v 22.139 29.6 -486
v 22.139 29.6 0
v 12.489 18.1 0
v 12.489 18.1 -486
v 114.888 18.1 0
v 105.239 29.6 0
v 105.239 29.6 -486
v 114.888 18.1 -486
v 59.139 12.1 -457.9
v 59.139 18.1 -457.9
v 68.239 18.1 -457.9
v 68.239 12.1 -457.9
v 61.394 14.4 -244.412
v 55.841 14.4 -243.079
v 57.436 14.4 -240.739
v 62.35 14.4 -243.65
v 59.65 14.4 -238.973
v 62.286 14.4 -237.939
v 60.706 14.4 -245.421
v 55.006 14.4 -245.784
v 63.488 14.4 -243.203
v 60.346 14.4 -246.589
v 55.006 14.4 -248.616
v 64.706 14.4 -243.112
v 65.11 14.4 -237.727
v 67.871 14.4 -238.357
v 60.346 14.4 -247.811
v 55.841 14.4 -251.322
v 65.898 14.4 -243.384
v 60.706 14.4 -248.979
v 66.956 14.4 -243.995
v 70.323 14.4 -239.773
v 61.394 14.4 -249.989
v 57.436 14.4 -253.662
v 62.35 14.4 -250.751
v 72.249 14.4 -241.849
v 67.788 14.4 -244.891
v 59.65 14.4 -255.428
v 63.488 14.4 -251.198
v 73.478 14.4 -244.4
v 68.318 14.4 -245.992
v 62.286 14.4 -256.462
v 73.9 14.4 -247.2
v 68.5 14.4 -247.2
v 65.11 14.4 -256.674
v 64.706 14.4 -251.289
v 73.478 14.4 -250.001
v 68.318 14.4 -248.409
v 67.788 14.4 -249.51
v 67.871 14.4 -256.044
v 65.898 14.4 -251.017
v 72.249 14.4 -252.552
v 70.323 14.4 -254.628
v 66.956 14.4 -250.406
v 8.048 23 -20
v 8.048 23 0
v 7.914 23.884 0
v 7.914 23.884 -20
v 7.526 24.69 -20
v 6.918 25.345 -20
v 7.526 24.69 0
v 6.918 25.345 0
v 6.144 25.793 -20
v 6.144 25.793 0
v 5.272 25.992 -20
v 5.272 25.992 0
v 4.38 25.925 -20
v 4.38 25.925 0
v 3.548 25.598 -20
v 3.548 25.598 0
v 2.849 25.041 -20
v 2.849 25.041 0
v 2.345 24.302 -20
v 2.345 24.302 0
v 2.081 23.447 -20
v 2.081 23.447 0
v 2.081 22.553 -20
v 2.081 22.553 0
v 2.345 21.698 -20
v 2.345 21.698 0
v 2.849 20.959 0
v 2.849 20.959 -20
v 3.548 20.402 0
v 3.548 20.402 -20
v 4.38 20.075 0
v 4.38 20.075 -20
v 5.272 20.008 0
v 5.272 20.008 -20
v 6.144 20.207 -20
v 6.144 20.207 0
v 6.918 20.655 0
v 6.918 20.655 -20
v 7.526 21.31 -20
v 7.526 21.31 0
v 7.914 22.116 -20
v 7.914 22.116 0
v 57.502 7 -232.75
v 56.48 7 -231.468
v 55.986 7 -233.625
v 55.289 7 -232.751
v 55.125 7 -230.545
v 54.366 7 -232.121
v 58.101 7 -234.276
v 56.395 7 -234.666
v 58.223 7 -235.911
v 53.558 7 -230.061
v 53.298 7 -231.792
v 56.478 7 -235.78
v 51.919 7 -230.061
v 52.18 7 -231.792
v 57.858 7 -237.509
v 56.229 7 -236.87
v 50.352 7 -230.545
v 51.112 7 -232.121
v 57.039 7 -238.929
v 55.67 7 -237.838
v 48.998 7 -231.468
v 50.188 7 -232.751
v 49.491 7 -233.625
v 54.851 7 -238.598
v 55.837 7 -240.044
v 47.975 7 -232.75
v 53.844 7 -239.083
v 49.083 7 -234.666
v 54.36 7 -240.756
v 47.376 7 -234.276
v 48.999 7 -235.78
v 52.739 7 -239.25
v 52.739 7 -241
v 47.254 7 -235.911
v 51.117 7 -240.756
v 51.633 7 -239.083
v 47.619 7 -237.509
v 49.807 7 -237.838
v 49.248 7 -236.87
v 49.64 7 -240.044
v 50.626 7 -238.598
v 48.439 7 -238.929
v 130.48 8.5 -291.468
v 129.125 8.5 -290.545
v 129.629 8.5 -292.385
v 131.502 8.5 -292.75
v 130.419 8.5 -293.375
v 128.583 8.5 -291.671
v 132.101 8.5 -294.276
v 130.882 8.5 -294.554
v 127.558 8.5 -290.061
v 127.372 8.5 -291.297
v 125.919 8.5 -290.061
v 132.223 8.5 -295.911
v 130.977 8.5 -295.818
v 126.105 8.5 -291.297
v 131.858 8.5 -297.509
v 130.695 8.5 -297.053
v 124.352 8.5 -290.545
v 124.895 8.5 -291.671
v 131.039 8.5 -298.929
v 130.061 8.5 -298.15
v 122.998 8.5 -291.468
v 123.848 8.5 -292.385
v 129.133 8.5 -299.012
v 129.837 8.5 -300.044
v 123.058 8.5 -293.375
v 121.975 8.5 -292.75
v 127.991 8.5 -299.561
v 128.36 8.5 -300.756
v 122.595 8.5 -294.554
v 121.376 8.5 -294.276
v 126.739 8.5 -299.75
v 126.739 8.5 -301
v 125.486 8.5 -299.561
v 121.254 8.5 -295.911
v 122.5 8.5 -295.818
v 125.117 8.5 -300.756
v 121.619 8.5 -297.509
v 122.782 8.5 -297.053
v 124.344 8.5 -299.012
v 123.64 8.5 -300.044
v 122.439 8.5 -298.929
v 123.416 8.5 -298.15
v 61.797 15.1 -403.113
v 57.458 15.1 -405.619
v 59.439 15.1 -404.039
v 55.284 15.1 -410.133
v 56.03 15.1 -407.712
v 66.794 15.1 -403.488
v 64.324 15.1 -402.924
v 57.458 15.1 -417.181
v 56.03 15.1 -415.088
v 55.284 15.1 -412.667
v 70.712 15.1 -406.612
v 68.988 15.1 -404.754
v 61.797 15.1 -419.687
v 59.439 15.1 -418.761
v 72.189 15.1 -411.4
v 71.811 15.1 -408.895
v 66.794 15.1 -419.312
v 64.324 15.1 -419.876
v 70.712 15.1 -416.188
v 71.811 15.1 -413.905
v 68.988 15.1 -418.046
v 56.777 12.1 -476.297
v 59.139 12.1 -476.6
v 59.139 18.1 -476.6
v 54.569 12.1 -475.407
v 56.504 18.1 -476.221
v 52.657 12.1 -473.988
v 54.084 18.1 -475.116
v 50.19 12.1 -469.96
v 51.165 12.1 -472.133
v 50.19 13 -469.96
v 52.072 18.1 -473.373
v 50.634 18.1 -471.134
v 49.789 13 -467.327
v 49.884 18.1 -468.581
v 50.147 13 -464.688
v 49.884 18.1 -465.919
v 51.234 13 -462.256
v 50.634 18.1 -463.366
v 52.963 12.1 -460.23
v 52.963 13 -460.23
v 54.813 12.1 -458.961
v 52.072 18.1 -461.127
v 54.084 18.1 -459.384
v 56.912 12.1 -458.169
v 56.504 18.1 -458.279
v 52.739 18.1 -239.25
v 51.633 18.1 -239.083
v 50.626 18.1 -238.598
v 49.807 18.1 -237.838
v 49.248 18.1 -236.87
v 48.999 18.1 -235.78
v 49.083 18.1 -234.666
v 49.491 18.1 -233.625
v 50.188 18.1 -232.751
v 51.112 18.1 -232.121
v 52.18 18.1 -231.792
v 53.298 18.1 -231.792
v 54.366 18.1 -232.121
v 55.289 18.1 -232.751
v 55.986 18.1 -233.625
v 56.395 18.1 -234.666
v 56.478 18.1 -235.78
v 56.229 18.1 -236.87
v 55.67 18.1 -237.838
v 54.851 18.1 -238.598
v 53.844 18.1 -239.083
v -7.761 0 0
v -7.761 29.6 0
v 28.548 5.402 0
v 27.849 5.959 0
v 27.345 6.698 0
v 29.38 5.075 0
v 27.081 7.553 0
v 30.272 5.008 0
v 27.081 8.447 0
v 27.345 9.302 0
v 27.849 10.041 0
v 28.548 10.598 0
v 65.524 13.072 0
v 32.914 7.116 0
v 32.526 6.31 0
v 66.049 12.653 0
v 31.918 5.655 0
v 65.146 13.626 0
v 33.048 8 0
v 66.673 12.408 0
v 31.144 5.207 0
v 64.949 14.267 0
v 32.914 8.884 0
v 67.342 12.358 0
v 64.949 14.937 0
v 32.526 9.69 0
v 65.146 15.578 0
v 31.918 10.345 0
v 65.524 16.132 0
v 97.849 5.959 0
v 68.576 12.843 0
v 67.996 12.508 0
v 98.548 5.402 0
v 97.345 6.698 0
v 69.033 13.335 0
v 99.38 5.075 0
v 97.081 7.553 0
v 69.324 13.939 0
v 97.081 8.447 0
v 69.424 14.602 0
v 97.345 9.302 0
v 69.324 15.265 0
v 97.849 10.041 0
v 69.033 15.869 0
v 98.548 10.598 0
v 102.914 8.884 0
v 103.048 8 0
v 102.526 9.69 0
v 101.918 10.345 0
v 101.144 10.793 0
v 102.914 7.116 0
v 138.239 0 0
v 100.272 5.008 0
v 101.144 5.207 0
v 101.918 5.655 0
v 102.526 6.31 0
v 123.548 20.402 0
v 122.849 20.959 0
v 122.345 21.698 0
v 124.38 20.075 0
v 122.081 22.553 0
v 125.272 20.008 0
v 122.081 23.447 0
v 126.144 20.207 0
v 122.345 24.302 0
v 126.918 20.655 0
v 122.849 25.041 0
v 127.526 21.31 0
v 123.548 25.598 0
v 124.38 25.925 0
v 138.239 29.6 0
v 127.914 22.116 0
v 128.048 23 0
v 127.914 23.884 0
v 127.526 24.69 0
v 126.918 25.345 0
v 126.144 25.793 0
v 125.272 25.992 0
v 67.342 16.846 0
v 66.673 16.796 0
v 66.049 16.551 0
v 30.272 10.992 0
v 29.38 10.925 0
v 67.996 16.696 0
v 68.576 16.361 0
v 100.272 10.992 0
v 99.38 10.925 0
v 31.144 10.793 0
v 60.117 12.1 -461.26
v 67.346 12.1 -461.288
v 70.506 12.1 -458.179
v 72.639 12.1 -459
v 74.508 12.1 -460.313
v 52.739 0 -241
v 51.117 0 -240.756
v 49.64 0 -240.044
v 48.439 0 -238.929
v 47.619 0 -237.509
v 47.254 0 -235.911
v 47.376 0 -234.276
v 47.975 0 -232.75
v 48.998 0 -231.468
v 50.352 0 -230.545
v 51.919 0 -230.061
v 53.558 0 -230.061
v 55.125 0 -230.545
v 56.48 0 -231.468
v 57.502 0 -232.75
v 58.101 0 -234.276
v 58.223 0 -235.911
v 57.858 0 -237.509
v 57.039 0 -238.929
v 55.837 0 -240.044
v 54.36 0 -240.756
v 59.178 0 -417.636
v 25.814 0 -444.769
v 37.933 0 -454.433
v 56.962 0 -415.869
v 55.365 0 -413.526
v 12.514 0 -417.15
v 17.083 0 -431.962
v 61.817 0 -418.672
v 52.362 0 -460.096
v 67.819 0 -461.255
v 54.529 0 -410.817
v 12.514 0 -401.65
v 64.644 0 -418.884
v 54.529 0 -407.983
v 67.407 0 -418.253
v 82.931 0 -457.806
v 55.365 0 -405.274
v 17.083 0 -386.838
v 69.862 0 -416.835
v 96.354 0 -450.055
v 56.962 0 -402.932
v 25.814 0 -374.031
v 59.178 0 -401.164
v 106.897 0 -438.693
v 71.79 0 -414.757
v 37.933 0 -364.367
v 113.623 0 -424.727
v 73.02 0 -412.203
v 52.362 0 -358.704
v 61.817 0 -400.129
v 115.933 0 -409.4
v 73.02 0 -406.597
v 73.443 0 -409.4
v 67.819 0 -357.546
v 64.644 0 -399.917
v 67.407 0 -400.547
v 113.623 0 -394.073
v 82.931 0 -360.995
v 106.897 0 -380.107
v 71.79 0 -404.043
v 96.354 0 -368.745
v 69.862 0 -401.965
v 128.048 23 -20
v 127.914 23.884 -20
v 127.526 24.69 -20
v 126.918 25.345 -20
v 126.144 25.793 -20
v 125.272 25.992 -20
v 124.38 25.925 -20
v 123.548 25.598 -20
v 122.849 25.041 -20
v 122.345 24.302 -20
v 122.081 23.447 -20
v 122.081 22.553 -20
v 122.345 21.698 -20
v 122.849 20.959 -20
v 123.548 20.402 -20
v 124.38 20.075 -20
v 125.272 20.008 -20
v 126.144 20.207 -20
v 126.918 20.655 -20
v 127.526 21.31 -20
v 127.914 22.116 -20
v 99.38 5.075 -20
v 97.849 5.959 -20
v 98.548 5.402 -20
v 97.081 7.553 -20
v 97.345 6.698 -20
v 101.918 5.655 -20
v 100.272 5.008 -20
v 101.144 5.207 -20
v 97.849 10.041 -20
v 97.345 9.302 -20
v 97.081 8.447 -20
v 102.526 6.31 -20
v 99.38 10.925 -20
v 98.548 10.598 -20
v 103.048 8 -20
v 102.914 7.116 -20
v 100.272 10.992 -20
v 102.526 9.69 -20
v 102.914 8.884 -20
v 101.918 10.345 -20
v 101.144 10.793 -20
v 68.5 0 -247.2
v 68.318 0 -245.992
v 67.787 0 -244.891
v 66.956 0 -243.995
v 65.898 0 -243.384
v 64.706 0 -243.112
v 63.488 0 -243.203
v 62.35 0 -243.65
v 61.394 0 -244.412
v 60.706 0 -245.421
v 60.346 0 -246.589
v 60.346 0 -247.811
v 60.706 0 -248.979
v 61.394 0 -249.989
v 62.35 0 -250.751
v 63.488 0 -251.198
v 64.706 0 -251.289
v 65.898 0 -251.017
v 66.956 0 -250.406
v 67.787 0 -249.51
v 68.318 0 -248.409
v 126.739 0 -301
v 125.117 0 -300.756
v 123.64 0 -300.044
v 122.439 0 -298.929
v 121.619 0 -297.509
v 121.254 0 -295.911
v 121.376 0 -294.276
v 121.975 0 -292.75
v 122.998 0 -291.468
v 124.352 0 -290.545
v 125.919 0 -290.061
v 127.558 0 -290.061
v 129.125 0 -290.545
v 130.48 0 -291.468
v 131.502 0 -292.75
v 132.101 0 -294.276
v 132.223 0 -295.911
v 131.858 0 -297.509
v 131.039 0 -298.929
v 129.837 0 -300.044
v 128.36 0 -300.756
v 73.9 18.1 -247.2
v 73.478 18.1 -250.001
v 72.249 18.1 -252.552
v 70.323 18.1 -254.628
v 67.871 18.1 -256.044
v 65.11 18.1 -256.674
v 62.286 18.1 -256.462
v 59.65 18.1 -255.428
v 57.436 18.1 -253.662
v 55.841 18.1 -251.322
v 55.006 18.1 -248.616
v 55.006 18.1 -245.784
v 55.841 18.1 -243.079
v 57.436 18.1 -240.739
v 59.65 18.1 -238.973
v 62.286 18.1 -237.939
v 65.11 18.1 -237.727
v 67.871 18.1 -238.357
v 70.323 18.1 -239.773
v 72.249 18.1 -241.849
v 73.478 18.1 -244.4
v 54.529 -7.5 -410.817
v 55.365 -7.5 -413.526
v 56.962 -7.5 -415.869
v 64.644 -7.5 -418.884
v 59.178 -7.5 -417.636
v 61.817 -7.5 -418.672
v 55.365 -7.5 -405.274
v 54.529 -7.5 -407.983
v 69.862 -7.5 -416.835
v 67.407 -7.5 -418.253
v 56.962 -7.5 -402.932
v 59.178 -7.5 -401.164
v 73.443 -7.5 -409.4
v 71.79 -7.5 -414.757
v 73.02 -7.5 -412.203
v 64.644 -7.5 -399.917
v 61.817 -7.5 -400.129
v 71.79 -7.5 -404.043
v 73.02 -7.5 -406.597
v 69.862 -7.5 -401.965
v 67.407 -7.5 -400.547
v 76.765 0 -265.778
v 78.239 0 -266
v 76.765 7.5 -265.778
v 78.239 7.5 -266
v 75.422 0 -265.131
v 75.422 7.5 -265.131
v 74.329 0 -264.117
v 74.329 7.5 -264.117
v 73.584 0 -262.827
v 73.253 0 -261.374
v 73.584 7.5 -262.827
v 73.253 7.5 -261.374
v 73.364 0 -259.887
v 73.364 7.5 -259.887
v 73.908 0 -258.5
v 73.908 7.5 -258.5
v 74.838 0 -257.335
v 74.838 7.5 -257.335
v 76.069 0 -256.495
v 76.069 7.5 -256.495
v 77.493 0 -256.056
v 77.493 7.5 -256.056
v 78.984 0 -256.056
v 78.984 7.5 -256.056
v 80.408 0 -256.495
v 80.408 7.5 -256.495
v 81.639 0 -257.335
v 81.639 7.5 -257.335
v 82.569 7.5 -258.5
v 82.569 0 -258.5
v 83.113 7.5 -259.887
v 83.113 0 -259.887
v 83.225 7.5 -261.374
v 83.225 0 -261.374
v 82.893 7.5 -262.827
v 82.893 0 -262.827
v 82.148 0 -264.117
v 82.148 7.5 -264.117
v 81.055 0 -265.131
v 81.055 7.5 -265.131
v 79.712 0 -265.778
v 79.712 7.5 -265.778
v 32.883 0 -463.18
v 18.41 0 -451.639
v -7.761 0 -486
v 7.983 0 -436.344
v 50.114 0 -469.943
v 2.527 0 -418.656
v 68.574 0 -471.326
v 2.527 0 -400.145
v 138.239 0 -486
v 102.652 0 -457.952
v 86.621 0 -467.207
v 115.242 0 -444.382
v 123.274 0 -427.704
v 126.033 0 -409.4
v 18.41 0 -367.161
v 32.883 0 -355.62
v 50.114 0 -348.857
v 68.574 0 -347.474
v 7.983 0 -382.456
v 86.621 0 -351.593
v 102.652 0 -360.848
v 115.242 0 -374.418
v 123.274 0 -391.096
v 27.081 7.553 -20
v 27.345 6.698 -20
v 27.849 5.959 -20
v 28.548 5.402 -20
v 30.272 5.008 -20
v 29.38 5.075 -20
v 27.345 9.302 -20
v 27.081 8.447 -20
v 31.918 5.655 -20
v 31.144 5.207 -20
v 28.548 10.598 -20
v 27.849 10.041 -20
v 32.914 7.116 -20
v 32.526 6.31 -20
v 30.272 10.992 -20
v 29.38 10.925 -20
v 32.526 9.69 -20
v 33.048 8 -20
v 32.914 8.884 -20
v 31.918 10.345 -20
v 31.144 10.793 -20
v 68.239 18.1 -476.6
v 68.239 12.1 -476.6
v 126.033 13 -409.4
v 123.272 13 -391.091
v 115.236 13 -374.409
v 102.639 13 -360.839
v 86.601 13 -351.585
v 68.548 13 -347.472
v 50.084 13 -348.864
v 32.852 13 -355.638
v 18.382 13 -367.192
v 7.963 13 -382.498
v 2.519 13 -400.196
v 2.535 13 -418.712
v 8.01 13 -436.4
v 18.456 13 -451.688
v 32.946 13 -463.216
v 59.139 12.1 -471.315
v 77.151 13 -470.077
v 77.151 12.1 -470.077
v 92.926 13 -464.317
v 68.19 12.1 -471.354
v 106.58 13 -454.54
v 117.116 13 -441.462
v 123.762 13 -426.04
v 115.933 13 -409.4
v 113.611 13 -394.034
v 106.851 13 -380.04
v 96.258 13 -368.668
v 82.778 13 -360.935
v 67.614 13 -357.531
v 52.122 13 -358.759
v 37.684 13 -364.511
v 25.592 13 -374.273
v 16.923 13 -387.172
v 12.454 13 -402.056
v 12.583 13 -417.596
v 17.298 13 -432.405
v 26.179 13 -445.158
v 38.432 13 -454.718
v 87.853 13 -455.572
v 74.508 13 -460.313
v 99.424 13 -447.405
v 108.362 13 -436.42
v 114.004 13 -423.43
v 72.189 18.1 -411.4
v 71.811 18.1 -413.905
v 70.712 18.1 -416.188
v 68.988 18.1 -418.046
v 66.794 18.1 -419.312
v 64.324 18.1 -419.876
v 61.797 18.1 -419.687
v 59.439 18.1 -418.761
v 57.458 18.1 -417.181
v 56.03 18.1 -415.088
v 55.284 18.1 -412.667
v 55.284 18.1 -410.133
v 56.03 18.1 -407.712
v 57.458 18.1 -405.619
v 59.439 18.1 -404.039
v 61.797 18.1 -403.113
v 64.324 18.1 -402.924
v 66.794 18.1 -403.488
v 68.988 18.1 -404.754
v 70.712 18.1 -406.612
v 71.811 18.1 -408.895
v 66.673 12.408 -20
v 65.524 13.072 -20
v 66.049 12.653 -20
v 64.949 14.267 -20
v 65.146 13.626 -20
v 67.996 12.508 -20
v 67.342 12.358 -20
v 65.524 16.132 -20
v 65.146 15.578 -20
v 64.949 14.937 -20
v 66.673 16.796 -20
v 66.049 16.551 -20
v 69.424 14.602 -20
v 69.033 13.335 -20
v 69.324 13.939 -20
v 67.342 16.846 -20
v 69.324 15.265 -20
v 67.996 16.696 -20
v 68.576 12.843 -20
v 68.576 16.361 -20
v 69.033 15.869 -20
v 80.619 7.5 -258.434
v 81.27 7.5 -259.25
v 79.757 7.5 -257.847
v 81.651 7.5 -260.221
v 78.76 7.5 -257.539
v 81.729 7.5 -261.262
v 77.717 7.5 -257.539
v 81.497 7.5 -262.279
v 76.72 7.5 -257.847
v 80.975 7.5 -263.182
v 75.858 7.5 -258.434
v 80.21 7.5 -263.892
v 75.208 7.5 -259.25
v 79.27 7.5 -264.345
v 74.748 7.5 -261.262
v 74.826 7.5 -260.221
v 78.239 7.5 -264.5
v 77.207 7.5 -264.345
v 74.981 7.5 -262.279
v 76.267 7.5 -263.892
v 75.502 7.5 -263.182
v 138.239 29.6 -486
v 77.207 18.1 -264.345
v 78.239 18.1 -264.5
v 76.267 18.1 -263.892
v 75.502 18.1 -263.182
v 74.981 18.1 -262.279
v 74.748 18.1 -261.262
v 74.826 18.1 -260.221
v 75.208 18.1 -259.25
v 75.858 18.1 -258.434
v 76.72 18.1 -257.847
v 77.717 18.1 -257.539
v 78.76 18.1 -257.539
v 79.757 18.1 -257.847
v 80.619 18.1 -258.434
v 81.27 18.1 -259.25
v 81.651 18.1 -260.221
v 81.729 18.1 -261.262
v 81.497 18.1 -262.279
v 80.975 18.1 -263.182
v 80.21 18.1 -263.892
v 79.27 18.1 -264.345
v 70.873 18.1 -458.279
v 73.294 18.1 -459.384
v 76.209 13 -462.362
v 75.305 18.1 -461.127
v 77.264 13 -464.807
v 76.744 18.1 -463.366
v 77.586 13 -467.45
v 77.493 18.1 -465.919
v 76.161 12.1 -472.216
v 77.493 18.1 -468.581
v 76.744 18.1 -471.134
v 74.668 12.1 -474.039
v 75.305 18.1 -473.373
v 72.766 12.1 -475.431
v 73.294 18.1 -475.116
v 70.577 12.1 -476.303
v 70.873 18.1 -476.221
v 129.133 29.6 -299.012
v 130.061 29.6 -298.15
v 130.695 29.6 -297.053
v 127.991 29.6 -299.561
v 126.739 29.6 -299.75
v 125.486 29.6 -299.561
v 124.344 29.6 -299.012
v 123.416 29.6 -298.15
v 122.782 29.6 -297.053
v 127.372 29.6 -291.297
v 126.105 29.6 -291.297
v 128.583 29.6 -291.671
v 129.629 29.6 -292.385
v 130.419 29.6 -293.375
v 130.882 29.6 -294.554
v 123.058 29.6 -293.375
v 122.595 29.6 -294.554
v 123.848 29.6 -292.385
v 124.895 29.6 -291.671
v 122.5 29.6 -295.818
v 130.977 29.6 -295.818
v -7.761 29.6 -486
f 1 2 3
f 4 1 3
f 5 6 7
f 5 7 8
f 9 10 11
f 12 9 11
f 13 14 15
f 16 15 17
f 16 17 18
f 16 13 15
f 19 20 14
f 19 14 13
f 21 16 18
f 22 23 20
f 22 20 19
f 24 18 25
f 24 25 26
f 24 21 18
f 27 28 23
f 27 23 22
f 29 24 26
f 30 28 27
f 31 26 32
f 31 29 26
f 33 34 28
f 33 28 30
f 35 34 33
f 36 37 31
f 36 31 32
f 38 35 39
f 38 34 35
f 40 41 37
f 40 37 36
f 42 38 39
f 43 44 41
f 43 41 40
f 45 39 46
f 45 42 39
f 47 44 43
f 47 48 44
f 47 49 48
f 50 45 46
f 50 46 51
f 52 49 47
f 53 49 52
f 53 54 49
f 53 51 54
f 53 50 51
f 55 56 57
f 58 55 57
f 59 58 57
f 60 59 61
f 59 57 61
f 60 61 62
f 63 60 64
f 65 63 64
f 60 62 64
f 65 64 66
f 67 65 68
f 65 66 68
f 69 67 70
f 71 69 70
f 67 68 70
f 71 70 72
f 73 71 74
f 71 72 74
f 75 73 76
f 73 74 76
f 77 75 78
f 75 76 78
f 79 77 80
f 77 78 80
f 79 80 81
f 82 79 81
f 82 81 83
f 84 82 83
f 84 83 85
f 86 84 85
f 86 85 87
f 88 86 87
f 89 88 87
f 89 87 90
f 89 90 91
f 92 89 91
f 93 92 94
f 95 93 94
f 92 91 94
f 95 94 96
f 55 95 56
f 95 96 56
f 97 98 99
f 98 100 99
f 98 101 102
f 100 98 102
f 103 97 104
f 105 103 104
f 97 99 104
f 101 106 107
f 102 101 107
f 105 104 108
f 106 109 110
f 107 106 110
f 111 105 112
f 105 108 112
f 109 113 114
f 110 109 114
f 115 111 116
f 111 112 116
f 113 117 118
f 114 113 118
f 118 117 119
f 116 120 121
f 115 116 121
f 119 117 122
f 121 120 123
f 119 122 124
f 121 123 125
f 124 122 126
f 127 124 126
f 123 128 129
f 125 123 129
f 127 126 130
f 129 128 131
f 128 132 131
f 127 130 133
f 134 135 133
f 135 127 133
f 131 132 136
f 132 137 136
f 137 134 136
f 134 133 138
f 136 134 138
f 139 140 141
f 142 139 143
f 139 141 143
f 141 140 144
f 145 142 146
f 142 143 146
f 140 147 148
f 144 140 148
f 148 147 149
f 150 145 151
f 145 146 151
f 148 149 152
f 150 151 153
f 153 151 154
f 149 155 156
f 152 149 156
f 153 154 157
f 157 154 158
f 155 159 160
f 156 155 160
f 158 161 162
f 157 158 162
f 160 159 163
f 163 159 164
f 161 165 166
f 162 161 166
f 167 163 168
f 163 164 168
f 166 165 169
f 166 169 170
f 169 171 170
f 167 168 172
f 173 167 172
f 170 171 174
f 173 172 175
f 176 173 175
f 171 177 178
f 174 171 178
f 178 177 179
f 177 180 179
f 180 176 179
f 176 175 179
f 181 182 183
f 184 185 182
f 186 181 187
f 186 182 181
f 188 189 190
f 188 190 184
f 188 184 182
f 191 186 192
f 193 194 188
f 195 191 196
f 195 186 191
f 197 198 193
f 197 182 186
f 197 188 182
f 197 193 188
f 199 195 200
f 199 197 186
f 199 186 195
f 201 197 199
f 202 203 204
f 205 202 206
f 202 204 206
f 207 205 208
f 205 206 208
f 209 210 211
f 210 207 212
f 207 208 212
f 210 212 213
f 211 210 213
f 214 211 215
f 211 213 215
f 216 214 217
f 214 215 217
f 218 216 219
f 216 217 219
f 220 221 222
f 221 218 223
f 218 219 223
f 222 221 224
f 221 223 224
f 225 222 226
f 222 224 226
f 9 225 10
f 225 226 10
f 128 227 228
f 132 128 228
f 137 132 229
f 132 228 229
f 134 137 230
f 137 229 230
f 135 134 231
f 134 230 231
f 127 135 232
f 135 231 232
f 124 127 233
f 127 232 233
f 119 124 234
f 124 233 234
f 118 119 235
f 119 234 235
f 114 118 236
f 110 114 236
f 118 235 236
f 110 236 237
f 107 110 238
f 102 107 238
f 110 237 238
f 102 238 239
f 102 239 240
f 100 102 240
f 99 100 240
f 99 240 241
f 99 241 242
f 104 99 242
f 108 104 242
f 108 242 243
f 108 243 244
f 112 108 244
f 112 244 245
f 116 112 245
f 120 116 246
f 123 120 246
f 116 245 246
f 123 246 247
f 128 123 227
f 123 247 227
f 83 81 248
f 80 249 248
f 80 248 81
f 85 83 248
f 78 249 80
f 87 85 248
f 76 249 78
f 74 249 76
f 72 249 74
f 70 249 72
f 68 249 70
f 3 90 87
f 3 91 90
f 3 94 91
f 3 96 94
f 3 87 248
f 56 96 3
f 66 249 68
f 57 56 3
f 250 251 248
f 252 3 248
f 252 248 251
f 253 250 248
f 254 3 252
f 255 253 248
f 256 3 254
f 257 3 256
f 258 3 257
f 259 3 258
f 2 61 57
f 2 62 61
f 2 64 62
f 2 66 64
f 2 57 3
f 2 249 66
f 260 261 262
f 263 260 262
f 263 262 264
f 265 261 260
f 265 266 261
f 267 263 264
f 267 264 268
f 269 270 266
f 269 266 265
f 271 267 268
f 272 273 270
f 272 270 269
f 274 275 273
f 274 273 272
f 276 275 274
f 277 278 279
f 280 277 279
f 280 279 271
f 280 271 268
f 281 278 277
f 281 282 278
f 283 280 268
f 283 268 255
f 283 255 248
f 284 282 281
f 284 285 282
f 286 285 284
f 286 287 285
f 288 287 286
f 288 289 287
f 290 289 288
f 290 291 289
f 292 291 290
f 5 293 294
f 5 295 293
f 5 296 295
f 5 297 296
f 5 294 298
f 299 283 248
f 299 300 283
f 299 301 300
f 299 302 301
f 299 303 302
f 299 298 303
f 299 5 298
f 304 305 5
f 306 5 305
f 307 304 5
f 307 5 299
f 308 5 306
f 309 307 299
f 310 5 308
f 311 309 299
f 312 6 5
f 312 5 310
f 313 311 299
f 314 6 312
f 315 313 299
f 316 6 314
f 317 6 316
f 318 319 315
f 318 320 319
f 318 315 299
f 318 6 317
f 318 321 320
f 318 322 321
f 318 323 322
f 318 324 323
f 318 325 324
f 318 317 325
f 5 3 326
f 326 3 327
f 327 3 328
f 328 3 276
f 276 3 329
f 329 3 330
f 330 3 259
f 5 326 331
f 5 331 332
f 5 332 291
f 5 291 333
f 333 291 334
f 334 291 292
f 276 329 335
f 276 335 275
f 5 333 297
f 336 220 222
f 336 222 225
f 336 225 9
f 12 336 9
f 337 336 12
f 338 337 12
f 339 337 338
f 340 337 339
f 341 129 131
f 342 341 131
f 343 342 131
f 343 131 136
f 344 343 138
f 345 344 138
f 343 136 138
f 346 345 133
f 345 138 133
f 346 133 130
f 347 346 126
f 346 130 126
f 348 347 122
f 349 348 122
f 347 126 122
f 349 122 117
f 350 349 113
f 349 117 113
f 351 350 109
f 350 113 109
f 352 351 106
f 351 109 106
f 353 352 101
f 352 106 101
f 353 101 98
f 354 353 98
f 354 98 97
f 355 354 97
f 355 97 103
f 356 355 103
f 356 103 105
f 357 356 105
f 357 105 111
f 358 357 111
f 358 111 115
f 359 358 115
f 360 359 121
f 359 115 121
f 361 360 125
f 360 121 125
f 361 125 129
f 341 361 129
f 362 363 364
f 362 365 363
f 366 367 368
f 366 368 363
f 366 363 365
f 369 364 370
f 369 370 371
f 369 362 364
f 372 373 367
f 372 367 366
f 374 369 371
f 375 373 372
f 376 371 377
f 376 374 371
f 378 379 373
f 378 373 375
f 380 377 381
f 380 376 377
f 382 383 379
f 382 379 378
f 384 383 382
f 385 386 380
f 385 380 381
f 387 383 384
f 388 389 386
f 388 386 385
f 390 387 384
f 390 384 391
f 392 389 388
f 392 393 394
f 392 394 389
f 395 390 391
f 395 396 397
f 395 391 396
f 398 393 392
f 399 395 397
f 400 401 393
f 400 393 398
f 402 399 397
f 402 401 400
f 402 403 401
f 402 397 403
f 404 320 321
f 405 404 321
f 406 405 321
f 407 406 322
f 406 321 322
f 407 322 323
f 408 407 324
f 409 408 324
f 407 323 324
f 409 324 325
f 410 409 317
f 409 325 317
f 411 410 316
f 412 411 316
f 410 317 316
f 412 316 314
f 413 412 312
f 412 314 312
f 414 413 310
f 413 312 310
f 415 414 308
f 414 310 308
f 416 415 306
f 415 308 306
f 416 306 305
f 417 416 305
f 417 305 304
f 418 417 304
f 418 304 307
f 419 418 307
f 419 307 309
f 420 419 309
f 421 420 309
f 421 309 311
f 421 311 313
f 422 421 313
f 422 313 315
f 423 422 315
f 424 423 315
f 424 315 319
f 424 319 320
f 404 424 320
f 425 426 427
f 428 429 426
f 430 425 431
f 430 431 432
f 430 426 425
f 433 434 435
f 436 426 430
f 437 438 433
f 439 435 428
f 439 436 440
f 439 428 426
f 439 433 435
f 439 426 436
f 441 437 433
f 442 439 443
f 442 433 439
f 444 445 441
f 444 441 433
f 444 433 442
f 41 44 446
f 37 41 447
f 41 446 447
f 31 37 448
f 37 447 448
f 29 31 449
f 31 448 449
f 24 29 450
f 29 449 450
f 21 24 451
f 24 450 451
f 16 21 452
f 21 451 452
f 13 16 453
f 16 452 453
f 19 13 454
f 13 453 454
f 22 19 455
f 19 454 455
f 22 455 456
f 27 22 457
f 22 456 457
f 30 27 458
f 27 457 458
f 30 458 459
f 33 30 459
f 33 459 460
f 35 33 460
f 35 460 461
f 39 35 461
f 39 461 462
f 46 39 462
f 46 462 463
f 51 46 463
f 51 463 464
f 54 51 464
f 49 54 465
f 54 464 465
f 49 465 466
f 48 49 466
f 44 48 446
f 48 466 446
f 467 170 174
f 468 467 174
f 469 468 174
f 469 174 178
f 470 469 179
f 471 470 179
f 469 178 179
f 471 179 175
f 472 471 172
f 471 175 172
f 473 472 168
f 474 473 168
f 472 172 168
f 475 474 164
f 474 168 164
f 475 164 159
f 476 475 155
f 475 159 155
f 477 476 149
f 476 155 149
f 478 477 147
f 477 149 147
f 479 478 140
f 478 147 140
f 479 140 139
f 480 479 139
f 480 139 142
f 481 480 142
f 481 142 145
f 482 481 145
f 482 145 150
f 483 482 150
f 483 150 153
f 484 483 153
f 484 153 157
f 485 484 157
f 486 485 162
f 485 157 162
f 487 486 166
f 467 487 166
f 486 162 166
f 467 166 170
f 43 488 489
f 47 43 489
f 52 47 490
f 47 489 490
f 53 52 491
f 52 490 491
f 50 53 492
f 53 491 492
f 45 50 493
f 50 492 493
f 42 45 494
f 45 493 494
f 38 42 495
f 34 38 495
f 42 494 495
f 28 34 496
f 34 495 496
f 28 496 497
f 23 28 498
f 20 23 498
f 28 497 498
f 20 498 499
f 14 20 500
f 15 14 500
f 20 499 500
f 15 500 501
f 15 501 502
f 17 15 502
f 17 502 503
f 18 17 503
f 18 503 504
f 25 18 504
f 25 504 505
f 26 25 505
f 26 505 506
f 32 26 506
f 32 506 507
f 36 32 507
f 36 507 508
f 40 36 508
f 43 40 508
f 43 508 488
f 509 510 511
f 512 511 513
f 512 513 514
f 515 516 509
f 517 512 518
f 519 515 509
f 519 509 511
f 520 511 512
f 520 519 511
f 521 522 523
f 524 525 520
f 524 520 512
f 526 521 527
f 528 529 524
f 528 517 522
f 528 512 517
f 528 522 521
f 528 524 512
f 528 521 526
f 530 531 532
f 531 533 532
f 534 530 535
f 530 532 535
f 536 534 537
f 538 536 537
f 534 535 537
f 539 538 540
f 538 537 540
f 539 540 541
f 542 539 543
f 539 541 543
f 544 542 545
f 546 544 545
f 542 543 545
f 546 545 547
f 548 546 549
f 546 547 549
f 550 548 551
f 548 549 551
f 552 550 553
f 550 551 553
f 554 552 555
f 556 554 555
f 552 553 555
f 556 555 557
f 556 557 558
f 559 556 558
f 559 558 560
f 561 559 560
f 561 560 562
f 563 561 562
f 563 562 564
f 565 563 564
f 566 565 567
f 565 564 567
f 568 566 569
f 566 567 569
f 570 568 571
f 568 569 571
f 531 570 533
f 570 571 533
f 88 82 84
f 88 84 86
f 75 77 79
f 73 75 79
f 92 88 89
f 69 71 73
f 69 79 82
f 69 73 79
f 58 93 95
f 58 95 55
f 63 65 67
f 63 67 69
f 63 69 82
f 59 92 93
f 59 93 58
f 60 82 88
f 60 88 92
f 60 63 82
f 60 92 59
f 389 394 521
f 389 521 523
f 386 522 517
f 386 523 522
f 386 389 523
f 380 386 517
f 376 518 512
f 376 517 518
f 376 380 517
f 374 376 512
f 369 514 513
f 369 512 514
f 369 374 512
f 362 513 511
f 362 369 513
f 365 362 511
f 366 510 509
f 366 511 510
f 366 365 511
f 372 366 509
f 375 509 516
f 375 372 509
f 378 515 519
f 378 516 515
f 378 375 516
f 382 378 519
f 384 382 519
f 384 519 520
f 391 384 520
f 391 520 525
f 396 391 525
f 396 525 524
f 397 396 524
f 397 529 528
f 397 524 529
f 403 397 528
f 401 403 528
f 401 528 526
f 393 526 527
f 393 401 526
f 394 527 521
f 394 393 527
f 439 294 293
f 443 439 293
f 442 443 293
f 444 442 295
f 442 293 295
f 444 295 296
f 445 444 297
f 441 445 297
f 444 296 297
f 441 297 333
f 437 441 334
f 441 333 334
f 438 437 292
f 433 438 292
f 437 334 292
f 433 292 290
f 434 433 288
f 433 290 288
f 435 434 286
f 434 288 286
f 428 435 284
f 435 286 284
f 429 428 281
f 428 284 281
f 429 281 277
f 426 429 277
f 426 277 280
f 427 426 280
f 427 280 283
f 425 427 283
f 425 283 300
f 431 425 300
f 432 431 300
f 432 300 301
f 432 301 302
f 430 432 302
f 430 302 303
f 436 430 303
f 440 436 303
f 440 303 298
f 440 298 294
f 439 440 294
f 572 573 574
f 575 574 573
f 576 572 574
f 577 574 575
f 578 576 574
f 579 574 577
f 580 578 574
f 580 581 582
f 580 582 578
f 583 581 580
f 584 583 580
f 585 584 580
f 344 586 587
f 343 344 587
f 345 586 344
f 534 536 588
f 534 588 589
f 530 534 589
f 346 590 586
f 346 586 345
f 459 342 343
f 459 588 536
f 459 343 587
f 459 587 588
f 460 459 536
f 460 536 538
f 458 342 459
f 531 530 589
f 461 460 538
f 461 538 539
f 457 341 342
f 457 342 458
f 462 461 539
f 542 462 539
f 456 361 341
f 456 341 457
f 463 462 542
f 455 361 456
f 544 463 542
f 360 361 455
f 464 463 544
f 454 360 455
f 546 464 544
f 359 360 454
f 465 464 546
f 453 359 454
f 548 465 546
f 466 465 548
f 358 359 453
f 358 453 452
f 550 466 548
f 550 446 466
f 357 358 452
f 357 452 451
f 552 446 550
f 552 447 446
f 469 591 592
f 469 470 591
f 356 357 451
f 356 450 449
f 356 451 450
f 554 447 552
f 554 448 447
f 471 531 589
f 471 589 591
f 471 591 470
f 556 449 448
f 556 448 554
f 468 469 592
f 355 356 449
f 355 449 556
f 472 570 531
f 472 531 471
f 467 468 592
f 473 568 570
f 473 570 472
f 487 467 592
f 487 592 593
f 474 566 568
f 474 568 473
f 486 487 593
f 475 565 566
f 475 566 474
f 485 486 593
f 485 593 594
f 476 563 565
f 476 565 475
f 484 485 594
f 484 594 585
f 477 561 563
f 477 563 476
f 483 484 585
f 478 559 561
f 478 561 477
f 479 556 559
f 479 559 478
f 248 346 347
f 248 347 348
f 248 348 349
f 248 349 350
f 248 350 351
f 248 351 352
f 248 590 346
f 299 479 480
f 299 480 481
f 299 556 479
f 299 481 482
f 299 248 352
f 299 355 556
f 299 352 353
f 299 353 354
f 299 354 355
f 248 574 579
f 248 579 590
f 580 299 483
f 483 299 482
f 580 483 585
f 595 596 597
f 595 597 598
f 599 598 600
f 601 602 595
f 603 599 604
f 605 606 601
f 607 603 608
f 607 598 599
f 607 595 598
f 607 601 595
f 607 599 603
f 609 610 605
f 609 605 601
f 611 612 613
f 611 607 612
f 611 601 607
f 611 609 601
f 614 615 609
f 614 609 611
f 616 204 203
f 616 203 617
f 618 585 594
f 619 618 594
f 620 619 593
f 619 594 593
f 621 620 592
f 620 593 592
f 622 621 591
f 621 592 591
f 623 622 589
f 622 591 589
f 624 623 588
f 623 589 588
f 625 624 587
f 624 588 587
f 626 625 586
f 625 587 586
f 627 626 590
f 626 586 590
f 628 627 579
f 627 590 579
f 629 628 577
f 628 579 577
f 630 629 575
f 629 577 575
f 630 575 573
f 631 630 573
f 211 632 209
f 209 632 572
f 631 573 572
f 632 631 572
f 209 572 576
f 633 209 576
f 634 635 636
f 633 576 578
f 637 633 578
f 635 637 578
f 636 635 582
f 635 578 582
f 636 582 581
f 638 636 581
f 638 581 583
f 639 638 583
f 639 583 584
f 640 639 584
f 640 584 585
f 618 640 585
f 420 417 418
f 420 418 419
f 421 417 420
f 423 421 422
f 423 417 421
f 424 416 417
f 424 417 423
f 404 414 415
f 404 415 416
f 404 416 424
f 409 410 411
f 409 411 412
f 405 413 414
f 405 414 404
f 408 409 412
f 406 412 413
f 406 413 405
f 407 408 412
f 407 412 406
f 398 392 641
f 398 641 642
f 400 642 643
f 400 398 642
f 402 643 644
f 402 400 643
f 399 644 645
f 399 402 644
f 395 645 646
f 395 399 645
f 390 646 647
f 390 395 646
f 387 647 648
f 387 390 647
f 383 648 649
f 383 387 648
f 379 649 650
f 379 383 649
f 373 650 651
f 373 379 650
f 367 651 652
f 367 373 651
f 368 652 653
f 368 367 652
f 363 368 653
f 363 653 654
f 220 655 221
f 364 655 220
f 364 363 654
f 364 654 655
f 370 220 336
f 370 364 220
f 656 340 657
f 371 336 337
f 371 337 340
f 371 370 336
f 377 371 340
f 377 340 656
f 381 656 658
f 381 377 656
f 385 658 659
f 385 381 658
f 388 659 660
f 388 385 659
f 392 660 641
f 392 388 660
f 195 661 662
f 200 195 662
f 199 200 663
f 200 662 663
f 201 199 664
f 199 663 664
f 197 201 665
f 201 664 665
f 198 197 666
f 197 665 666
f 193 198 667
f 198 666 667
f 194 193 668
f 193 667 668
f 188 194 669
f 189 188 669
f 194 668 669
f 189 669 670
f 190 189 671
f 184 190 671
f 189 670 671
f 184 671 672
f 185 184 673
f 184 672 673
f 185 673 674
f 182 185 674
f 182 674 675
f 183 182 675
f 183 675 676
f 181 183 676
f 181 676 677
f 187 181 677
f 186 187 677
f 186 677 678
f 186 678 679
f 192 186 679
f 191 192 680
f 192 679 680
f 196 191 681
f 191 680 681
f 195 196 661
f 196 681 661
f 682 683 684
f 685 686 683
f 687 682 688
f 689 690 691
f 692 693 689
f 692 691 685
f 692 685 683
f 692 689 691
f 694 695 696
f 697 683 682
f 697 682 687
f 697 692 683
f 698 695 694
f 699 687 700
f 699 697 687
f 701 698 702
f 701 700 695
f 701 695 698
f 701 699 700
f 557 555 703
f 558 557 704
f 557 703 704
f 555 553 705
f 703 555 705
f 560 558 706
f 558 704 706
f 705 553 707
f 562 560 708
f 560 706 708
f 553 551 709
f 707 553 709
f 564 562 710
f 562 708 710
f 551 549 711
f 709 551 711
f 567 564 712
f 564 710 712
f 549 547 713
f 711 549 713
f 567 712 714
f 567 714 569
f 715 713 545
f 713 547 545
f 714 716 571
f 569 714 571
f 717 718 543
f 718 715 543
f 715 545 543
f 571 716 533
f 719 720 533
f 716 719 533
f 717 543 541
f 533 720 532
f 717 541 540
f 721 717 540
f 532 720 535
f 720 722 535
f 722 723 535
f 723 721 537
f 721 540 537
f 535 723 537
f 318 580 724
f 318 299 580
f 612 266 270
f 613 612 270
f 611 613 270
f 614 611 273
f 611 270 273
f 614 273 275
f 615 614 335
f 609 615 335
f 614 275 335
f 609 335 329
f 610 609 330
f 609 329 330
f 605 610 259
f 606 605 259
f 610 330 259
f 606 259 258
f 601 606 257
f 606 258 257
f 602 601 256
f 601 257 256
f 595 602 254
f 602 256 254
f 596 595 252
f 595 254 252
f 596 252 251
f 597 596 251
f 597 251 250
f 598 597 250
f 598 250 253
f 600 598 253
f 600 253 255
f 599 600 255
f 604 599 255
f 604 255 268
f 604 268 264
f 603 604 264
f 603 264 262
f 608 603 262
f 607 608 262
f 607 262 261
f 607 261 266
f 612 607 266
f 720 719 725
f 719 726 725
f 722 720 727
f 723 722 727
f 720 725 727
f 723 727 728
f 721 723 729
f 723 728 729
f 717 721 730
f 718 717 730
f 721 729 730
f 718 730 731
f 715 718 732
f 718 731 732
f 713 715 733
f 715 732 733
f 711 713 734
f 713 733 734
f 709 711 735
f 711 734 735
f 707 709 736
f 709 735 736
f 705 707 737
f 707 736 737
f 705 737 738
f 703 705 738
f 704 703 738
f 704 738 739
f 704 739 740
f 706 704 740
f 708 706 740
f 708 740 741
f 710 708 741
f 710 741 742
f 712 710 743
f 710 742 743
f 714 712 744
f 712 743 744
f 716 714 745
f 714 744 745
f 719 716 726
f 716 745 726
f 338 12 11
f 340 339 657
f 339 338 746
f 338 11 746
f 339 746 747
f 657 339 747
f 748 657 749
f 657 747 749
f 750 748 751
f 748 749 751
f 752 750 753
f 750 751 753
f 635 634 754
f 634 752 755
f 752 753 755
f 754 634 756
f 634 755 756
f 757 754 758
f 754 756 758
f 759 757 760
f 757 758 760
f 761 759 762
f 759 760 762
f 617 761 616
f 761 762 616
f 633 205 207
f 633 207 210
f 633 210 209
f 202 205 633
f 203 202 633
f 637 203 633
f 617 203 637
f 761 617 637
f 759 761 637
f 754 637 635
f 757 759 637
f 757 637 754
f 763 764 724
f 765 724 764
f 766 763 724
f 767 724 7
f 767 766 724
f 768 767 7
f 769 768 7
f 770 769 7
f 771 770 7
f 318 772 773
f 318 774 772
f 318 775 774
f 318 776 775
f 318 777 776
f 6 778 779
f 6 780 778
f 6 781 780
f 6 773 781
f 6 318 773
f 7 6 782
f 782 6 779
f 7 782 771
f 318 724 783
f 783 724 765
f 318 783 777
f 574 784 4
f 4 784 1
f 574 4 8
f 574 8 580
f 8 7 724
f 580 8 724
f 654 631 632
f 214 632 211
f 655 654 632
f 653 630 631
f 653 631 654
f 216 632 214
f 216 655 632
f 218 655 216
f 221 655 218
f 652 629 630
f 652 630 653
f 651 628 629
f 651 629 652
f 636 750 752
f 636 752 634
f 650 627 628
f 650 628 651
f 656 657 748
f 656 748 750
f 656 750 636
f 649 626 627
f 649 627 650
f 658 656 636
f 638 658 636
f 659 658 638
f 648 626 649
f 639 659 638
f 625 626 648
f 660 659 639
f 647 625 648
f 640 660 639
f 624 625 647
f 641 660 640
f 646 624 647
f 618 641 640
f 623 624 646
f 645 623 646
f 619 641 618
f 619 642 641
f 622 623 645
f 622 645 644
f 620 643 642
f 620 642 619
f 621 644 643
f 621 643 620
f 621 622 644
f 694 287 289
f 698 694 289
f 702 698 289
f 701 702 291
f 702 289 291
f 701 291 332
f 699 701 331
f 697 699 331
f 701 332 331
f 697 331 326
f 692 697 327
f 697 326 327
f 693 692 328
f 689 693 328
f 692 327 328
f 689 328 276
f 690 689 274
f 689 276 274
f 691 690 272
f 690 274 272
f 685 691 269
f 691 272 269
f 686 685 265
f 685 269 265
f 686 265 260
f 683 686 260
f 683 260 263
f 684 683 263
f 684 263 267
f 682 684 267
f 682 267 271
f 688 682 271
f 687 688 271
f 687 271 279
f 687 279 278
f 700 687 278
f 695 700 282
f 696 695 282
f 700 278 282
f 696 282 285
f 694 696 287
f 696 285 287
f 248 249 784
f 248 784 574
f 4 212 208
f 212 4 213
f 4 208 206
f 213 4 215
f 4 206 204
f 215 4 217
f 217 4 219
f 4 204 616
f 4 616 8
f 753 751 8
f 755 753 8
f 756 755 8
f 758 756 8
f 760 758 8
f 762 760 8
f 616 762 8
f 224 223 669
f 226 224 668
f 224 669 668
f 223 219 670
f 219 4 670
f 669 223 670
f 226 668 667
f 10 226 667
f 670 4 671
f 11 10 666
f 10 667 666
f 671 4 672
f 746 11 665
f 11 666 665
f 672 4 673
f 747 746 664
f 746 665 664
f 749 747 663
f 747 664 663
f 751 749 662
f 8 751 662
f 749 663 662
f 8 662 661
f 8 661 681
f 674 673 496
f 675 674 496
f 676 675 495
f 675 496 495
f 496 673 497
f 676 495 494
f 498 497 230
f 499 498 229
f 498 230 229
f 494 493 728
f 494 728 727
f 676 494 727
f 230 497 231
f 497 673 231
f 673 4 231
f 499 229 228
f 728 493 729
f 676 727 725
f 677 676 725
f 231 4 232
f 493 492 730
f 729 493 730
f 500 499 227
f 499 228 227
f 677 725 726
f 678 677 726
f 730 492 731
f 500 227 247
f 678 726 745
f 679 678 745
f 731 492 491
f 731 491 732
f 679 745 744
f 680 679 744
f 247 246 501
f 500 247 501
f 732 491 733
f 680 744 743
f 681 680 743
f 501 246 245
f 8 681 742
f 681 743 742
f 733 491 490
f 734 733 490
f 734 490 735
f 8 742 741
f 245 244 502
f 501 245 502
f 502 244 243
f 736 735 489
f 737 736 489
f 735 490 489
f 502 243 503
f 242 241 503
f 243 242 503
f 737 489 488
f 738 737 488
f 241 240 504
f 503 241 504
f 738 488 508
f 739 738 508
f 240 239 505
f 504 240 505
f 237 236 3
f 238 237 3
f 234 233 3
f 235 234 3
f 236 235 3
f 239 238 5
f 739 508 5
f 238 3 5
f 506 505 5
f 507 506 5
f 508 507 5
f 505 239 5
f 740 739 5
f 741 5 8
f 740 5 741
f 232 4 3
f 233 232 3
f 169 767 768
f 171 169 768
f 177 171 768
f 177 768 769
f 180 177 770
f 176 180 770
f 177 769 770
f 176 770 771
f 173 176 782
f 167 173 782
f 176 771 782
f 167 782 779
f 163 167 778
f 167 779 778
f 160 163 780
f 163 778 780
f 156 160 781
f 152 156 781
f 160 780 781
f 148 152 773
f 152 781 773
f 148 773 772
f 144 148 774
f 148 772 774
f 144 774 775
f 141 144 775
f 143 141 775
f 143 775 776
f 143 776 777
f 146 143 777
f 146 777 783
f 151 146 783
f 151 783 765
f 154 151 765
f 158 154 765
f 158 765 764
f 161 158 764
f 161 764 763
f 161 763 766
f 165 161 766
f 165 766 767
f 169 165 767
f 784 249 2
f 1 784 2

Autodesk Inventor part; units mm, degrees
ref_plane "YZ Plane" through (0, 0, 0) normal (1, 0, 0) x (0, 1, 0)
ref_plane "XZ Plane" through (0, 0, 0) normal (0, 1, 0) x (-1, 0, 0)
ref_plane "XY Plane" through (0, 0, 0) normal (0, 0, 1) x (1, 0, 0)
sketch "Sketch1" plane through (0, 0, 0) normal (0, 0, 1) x (1, 0, 0)
  line L0 (-7.7614, 0) -> (138.2386, 0)
  line L1 (138.2386, 0) -> (138.2386, 29.6)
  line L2 (-7.7614, 29.6) -> (-7.7614, 0)
  line L3 (-7.7614, 29.6) -> (22.1386, 29.6)
  line L4 (12.489, 18.1) -> (114.8883, 18.1)
  line L5 (22.1386, 29.6) -> (12.489, 18.1)
  line L6 (22.1386, 29.6) -> (41.4586, 29.6) construction
  line L7 (138.2386, 29.6) -> (105.2386, 29.6)
  line L8 (105.2386, 29.6) -> (114.8883, 18.1)
  point P0 (0, 0)
  dimension "d0" = 146
  dimension "d1" = 29.6
  dimension "d2" = 29.9
  dimension "d4" = 130
  dimension "d5" = 33
  dimension "d6" = 50
extrude "Extrusion1" add sketch "Sketch1" against normal blind 486
sketch "Sketch2" plane through (-7.7614, 29.6, 0) normal (0, 1, 0) x (1, 0, 0)
  line L0 (113, 0) -> (122.6496, 0) projected
  line L1 (124, 486) -> (113, 0)
  line L2 (113, 0) -> (113, 486) projected
  line L3 (113, 486) -> (124, 486)
  line L4 (122.6496, 0) -> (122.6496, 486) projected
  line L5 (113, 486) -> (113, 0)
  line L6 (146, 0) -> (146, 486) projected
  point P0 (7.7614, 0)
  dimension "d9" = 22
sketch "Sketch3" plane through (-7.7614, 0, 0) normal (0, -1, 0) x (1, 0, 0)
  line L0 (20.2504, -486) -> (122.6496, -486) projected
  line L1 (0, 0) -> (146, 0) projected
  circle A0 centre (71.6943, -409.4001) radius 62.1
  line L2 (71.45, -486) -> (71.4962, -471.5001)
  circle A1 centre (71.6943, -409.4001) radius 52
  circle A2 centre (71.6943, -409.4001) radius 9.51
  circle A3 centre (72.1613, -247.2004) radius 4.1
  point P0 (7.7614, 0)
  dimension "d10" = 124.2
  dimension "d11" = 14.5
  dimension "d12" = 62.1
  dimension "d13" = 104
  dimension "d14" = 19.02
  dimension "d15" = 8.2
extrude "Extrusion2" cut sketch "Sketch3" against normal blind 13 contours A0
extrude "Extrusion3" add sketch "Sketch3" along normal blind 7.5 contours A2
extrude "Extrusion4" cut sketch "Sketch3" against normal through all contours A3
sketch "Sketch4" plane through (12.489, 18.1, 0) normal (0, 1, 0) x (1, 0, 0)
  circle A0 centre (51.911, 247.2004) radius 4.1 projected
  circle A1 centre (51.911, 247.2004) radius 9.5
  line L0 (0, 486) -> (102.3993, 486) projected
  line L1 (51.1996, 486) -> (51.1996, 476.6)
  arc A2 (46.6496, 476.6) -> (46.6496, 457.9) centre (46.6496, 467.25) ccw
  arc A3 (55.7496, 457.9) -> (55.7496, 476.6) centre (55.7496, 467.25) ccw
  line L2 (46.6496, 476.6) -> (55.7496, 476.6)
  line L3 (46.6496, 457.9) -> (55.7496, 457.9)
  circle A4 centre (51.1996, 411.4) radius 8.5
  point P0 (-12.489, 0)
  point P1 (51.1996, 476.6)
  dimension "d23" = 19
  dimension "d26" = 9.4
  dimension "d29" = 0
  dimension "d30" = 18.7
  dimension "d31" = 18.7
  dimension "d38" = 17
  dimension "d39" = 46.5
extrude "Extrusion5" cut sketch "Sketch4" against normal blind 3.7 contours A1
extrude "Extrusion7" cut sketch "Sketch4" against normal blind 6 contours L2 A3 L3 A2
extrude "Extrusion8" cut sketch "Sketch4" against normal blind 3 contours A4
sketch "Sketch5" plane through (-7.7614, 0, 0) normal (0, -1, 0) x (1, 0, 0)
  point P0 (7.7614, 0)
sketch "Sketch6" plane through (-7.7614, 0, 0) normal (0, -1, 0) x (1, 0, 0)
  circle A0 centre (86, -261) radius 5
  line L0 (146, -486) -> (0, -486) projected
  line L1 (146, 0) -> (146, -486) projected
  circle A1 centre (60.5, -235.5) radius 5.5
  line L2 (0, 0) -> (0, -486) projected
  circle A2 centre (134.5, -295.5) radius 5.5
  point P0 (7.7614, 0)
  dimension "d42" = 10
  dimension "d43" = 225
  dimension "d44" = 60
  dimension "d45" = 11
  dimension "d46" = 60.5
  dimension "d47" = 250.5
  dimension "d48" = 11
  dimension "d49" = 190.5
  dimension "d50" = 11.5
hole "Hole1" at (126.7386, 0, -295.5) direction (0, 1, 0) diameter 8.5 end through all counterbore diameter 11 counterbore depth 8.5
hole "Hole2" at (78.2386, 0, -261) direction (0, 1, 0) diameter 7 end through all counterbore diameter 10 counterbore depth 7.5
hole "Hole3" at (52.7386, 0, -235.5) direction (0, 1, 0) diameter 7.5 end through all counterbore diameter 11 counterbore depth 7
thread "Thread1" size "M9x1.25" class "6H" standard "ANSI Metric M Profile" full length
sketch "Sketch12" plane through (0, 0, 0) normal (0, 0, 1) x (1, 0, 0)
  circle A0 centre (125.0477, 23) radius 3 projected
  circle A1 centre (100.0477, 8) radius 3 projected
  circle A2 centre (30.0477, 8) radius 3 projected
  circle A3 centre (5.0477, 23) radius 3 projected
  circle A4 centre (67.1736, 14.602) radius 2.25 projected
  point P0 (0, 0)
extrude "Extrusion9" cut sketch "Sketch12" against normal blind 20
properties part number "slide ontop of saddle" material "Steel, Cast"
